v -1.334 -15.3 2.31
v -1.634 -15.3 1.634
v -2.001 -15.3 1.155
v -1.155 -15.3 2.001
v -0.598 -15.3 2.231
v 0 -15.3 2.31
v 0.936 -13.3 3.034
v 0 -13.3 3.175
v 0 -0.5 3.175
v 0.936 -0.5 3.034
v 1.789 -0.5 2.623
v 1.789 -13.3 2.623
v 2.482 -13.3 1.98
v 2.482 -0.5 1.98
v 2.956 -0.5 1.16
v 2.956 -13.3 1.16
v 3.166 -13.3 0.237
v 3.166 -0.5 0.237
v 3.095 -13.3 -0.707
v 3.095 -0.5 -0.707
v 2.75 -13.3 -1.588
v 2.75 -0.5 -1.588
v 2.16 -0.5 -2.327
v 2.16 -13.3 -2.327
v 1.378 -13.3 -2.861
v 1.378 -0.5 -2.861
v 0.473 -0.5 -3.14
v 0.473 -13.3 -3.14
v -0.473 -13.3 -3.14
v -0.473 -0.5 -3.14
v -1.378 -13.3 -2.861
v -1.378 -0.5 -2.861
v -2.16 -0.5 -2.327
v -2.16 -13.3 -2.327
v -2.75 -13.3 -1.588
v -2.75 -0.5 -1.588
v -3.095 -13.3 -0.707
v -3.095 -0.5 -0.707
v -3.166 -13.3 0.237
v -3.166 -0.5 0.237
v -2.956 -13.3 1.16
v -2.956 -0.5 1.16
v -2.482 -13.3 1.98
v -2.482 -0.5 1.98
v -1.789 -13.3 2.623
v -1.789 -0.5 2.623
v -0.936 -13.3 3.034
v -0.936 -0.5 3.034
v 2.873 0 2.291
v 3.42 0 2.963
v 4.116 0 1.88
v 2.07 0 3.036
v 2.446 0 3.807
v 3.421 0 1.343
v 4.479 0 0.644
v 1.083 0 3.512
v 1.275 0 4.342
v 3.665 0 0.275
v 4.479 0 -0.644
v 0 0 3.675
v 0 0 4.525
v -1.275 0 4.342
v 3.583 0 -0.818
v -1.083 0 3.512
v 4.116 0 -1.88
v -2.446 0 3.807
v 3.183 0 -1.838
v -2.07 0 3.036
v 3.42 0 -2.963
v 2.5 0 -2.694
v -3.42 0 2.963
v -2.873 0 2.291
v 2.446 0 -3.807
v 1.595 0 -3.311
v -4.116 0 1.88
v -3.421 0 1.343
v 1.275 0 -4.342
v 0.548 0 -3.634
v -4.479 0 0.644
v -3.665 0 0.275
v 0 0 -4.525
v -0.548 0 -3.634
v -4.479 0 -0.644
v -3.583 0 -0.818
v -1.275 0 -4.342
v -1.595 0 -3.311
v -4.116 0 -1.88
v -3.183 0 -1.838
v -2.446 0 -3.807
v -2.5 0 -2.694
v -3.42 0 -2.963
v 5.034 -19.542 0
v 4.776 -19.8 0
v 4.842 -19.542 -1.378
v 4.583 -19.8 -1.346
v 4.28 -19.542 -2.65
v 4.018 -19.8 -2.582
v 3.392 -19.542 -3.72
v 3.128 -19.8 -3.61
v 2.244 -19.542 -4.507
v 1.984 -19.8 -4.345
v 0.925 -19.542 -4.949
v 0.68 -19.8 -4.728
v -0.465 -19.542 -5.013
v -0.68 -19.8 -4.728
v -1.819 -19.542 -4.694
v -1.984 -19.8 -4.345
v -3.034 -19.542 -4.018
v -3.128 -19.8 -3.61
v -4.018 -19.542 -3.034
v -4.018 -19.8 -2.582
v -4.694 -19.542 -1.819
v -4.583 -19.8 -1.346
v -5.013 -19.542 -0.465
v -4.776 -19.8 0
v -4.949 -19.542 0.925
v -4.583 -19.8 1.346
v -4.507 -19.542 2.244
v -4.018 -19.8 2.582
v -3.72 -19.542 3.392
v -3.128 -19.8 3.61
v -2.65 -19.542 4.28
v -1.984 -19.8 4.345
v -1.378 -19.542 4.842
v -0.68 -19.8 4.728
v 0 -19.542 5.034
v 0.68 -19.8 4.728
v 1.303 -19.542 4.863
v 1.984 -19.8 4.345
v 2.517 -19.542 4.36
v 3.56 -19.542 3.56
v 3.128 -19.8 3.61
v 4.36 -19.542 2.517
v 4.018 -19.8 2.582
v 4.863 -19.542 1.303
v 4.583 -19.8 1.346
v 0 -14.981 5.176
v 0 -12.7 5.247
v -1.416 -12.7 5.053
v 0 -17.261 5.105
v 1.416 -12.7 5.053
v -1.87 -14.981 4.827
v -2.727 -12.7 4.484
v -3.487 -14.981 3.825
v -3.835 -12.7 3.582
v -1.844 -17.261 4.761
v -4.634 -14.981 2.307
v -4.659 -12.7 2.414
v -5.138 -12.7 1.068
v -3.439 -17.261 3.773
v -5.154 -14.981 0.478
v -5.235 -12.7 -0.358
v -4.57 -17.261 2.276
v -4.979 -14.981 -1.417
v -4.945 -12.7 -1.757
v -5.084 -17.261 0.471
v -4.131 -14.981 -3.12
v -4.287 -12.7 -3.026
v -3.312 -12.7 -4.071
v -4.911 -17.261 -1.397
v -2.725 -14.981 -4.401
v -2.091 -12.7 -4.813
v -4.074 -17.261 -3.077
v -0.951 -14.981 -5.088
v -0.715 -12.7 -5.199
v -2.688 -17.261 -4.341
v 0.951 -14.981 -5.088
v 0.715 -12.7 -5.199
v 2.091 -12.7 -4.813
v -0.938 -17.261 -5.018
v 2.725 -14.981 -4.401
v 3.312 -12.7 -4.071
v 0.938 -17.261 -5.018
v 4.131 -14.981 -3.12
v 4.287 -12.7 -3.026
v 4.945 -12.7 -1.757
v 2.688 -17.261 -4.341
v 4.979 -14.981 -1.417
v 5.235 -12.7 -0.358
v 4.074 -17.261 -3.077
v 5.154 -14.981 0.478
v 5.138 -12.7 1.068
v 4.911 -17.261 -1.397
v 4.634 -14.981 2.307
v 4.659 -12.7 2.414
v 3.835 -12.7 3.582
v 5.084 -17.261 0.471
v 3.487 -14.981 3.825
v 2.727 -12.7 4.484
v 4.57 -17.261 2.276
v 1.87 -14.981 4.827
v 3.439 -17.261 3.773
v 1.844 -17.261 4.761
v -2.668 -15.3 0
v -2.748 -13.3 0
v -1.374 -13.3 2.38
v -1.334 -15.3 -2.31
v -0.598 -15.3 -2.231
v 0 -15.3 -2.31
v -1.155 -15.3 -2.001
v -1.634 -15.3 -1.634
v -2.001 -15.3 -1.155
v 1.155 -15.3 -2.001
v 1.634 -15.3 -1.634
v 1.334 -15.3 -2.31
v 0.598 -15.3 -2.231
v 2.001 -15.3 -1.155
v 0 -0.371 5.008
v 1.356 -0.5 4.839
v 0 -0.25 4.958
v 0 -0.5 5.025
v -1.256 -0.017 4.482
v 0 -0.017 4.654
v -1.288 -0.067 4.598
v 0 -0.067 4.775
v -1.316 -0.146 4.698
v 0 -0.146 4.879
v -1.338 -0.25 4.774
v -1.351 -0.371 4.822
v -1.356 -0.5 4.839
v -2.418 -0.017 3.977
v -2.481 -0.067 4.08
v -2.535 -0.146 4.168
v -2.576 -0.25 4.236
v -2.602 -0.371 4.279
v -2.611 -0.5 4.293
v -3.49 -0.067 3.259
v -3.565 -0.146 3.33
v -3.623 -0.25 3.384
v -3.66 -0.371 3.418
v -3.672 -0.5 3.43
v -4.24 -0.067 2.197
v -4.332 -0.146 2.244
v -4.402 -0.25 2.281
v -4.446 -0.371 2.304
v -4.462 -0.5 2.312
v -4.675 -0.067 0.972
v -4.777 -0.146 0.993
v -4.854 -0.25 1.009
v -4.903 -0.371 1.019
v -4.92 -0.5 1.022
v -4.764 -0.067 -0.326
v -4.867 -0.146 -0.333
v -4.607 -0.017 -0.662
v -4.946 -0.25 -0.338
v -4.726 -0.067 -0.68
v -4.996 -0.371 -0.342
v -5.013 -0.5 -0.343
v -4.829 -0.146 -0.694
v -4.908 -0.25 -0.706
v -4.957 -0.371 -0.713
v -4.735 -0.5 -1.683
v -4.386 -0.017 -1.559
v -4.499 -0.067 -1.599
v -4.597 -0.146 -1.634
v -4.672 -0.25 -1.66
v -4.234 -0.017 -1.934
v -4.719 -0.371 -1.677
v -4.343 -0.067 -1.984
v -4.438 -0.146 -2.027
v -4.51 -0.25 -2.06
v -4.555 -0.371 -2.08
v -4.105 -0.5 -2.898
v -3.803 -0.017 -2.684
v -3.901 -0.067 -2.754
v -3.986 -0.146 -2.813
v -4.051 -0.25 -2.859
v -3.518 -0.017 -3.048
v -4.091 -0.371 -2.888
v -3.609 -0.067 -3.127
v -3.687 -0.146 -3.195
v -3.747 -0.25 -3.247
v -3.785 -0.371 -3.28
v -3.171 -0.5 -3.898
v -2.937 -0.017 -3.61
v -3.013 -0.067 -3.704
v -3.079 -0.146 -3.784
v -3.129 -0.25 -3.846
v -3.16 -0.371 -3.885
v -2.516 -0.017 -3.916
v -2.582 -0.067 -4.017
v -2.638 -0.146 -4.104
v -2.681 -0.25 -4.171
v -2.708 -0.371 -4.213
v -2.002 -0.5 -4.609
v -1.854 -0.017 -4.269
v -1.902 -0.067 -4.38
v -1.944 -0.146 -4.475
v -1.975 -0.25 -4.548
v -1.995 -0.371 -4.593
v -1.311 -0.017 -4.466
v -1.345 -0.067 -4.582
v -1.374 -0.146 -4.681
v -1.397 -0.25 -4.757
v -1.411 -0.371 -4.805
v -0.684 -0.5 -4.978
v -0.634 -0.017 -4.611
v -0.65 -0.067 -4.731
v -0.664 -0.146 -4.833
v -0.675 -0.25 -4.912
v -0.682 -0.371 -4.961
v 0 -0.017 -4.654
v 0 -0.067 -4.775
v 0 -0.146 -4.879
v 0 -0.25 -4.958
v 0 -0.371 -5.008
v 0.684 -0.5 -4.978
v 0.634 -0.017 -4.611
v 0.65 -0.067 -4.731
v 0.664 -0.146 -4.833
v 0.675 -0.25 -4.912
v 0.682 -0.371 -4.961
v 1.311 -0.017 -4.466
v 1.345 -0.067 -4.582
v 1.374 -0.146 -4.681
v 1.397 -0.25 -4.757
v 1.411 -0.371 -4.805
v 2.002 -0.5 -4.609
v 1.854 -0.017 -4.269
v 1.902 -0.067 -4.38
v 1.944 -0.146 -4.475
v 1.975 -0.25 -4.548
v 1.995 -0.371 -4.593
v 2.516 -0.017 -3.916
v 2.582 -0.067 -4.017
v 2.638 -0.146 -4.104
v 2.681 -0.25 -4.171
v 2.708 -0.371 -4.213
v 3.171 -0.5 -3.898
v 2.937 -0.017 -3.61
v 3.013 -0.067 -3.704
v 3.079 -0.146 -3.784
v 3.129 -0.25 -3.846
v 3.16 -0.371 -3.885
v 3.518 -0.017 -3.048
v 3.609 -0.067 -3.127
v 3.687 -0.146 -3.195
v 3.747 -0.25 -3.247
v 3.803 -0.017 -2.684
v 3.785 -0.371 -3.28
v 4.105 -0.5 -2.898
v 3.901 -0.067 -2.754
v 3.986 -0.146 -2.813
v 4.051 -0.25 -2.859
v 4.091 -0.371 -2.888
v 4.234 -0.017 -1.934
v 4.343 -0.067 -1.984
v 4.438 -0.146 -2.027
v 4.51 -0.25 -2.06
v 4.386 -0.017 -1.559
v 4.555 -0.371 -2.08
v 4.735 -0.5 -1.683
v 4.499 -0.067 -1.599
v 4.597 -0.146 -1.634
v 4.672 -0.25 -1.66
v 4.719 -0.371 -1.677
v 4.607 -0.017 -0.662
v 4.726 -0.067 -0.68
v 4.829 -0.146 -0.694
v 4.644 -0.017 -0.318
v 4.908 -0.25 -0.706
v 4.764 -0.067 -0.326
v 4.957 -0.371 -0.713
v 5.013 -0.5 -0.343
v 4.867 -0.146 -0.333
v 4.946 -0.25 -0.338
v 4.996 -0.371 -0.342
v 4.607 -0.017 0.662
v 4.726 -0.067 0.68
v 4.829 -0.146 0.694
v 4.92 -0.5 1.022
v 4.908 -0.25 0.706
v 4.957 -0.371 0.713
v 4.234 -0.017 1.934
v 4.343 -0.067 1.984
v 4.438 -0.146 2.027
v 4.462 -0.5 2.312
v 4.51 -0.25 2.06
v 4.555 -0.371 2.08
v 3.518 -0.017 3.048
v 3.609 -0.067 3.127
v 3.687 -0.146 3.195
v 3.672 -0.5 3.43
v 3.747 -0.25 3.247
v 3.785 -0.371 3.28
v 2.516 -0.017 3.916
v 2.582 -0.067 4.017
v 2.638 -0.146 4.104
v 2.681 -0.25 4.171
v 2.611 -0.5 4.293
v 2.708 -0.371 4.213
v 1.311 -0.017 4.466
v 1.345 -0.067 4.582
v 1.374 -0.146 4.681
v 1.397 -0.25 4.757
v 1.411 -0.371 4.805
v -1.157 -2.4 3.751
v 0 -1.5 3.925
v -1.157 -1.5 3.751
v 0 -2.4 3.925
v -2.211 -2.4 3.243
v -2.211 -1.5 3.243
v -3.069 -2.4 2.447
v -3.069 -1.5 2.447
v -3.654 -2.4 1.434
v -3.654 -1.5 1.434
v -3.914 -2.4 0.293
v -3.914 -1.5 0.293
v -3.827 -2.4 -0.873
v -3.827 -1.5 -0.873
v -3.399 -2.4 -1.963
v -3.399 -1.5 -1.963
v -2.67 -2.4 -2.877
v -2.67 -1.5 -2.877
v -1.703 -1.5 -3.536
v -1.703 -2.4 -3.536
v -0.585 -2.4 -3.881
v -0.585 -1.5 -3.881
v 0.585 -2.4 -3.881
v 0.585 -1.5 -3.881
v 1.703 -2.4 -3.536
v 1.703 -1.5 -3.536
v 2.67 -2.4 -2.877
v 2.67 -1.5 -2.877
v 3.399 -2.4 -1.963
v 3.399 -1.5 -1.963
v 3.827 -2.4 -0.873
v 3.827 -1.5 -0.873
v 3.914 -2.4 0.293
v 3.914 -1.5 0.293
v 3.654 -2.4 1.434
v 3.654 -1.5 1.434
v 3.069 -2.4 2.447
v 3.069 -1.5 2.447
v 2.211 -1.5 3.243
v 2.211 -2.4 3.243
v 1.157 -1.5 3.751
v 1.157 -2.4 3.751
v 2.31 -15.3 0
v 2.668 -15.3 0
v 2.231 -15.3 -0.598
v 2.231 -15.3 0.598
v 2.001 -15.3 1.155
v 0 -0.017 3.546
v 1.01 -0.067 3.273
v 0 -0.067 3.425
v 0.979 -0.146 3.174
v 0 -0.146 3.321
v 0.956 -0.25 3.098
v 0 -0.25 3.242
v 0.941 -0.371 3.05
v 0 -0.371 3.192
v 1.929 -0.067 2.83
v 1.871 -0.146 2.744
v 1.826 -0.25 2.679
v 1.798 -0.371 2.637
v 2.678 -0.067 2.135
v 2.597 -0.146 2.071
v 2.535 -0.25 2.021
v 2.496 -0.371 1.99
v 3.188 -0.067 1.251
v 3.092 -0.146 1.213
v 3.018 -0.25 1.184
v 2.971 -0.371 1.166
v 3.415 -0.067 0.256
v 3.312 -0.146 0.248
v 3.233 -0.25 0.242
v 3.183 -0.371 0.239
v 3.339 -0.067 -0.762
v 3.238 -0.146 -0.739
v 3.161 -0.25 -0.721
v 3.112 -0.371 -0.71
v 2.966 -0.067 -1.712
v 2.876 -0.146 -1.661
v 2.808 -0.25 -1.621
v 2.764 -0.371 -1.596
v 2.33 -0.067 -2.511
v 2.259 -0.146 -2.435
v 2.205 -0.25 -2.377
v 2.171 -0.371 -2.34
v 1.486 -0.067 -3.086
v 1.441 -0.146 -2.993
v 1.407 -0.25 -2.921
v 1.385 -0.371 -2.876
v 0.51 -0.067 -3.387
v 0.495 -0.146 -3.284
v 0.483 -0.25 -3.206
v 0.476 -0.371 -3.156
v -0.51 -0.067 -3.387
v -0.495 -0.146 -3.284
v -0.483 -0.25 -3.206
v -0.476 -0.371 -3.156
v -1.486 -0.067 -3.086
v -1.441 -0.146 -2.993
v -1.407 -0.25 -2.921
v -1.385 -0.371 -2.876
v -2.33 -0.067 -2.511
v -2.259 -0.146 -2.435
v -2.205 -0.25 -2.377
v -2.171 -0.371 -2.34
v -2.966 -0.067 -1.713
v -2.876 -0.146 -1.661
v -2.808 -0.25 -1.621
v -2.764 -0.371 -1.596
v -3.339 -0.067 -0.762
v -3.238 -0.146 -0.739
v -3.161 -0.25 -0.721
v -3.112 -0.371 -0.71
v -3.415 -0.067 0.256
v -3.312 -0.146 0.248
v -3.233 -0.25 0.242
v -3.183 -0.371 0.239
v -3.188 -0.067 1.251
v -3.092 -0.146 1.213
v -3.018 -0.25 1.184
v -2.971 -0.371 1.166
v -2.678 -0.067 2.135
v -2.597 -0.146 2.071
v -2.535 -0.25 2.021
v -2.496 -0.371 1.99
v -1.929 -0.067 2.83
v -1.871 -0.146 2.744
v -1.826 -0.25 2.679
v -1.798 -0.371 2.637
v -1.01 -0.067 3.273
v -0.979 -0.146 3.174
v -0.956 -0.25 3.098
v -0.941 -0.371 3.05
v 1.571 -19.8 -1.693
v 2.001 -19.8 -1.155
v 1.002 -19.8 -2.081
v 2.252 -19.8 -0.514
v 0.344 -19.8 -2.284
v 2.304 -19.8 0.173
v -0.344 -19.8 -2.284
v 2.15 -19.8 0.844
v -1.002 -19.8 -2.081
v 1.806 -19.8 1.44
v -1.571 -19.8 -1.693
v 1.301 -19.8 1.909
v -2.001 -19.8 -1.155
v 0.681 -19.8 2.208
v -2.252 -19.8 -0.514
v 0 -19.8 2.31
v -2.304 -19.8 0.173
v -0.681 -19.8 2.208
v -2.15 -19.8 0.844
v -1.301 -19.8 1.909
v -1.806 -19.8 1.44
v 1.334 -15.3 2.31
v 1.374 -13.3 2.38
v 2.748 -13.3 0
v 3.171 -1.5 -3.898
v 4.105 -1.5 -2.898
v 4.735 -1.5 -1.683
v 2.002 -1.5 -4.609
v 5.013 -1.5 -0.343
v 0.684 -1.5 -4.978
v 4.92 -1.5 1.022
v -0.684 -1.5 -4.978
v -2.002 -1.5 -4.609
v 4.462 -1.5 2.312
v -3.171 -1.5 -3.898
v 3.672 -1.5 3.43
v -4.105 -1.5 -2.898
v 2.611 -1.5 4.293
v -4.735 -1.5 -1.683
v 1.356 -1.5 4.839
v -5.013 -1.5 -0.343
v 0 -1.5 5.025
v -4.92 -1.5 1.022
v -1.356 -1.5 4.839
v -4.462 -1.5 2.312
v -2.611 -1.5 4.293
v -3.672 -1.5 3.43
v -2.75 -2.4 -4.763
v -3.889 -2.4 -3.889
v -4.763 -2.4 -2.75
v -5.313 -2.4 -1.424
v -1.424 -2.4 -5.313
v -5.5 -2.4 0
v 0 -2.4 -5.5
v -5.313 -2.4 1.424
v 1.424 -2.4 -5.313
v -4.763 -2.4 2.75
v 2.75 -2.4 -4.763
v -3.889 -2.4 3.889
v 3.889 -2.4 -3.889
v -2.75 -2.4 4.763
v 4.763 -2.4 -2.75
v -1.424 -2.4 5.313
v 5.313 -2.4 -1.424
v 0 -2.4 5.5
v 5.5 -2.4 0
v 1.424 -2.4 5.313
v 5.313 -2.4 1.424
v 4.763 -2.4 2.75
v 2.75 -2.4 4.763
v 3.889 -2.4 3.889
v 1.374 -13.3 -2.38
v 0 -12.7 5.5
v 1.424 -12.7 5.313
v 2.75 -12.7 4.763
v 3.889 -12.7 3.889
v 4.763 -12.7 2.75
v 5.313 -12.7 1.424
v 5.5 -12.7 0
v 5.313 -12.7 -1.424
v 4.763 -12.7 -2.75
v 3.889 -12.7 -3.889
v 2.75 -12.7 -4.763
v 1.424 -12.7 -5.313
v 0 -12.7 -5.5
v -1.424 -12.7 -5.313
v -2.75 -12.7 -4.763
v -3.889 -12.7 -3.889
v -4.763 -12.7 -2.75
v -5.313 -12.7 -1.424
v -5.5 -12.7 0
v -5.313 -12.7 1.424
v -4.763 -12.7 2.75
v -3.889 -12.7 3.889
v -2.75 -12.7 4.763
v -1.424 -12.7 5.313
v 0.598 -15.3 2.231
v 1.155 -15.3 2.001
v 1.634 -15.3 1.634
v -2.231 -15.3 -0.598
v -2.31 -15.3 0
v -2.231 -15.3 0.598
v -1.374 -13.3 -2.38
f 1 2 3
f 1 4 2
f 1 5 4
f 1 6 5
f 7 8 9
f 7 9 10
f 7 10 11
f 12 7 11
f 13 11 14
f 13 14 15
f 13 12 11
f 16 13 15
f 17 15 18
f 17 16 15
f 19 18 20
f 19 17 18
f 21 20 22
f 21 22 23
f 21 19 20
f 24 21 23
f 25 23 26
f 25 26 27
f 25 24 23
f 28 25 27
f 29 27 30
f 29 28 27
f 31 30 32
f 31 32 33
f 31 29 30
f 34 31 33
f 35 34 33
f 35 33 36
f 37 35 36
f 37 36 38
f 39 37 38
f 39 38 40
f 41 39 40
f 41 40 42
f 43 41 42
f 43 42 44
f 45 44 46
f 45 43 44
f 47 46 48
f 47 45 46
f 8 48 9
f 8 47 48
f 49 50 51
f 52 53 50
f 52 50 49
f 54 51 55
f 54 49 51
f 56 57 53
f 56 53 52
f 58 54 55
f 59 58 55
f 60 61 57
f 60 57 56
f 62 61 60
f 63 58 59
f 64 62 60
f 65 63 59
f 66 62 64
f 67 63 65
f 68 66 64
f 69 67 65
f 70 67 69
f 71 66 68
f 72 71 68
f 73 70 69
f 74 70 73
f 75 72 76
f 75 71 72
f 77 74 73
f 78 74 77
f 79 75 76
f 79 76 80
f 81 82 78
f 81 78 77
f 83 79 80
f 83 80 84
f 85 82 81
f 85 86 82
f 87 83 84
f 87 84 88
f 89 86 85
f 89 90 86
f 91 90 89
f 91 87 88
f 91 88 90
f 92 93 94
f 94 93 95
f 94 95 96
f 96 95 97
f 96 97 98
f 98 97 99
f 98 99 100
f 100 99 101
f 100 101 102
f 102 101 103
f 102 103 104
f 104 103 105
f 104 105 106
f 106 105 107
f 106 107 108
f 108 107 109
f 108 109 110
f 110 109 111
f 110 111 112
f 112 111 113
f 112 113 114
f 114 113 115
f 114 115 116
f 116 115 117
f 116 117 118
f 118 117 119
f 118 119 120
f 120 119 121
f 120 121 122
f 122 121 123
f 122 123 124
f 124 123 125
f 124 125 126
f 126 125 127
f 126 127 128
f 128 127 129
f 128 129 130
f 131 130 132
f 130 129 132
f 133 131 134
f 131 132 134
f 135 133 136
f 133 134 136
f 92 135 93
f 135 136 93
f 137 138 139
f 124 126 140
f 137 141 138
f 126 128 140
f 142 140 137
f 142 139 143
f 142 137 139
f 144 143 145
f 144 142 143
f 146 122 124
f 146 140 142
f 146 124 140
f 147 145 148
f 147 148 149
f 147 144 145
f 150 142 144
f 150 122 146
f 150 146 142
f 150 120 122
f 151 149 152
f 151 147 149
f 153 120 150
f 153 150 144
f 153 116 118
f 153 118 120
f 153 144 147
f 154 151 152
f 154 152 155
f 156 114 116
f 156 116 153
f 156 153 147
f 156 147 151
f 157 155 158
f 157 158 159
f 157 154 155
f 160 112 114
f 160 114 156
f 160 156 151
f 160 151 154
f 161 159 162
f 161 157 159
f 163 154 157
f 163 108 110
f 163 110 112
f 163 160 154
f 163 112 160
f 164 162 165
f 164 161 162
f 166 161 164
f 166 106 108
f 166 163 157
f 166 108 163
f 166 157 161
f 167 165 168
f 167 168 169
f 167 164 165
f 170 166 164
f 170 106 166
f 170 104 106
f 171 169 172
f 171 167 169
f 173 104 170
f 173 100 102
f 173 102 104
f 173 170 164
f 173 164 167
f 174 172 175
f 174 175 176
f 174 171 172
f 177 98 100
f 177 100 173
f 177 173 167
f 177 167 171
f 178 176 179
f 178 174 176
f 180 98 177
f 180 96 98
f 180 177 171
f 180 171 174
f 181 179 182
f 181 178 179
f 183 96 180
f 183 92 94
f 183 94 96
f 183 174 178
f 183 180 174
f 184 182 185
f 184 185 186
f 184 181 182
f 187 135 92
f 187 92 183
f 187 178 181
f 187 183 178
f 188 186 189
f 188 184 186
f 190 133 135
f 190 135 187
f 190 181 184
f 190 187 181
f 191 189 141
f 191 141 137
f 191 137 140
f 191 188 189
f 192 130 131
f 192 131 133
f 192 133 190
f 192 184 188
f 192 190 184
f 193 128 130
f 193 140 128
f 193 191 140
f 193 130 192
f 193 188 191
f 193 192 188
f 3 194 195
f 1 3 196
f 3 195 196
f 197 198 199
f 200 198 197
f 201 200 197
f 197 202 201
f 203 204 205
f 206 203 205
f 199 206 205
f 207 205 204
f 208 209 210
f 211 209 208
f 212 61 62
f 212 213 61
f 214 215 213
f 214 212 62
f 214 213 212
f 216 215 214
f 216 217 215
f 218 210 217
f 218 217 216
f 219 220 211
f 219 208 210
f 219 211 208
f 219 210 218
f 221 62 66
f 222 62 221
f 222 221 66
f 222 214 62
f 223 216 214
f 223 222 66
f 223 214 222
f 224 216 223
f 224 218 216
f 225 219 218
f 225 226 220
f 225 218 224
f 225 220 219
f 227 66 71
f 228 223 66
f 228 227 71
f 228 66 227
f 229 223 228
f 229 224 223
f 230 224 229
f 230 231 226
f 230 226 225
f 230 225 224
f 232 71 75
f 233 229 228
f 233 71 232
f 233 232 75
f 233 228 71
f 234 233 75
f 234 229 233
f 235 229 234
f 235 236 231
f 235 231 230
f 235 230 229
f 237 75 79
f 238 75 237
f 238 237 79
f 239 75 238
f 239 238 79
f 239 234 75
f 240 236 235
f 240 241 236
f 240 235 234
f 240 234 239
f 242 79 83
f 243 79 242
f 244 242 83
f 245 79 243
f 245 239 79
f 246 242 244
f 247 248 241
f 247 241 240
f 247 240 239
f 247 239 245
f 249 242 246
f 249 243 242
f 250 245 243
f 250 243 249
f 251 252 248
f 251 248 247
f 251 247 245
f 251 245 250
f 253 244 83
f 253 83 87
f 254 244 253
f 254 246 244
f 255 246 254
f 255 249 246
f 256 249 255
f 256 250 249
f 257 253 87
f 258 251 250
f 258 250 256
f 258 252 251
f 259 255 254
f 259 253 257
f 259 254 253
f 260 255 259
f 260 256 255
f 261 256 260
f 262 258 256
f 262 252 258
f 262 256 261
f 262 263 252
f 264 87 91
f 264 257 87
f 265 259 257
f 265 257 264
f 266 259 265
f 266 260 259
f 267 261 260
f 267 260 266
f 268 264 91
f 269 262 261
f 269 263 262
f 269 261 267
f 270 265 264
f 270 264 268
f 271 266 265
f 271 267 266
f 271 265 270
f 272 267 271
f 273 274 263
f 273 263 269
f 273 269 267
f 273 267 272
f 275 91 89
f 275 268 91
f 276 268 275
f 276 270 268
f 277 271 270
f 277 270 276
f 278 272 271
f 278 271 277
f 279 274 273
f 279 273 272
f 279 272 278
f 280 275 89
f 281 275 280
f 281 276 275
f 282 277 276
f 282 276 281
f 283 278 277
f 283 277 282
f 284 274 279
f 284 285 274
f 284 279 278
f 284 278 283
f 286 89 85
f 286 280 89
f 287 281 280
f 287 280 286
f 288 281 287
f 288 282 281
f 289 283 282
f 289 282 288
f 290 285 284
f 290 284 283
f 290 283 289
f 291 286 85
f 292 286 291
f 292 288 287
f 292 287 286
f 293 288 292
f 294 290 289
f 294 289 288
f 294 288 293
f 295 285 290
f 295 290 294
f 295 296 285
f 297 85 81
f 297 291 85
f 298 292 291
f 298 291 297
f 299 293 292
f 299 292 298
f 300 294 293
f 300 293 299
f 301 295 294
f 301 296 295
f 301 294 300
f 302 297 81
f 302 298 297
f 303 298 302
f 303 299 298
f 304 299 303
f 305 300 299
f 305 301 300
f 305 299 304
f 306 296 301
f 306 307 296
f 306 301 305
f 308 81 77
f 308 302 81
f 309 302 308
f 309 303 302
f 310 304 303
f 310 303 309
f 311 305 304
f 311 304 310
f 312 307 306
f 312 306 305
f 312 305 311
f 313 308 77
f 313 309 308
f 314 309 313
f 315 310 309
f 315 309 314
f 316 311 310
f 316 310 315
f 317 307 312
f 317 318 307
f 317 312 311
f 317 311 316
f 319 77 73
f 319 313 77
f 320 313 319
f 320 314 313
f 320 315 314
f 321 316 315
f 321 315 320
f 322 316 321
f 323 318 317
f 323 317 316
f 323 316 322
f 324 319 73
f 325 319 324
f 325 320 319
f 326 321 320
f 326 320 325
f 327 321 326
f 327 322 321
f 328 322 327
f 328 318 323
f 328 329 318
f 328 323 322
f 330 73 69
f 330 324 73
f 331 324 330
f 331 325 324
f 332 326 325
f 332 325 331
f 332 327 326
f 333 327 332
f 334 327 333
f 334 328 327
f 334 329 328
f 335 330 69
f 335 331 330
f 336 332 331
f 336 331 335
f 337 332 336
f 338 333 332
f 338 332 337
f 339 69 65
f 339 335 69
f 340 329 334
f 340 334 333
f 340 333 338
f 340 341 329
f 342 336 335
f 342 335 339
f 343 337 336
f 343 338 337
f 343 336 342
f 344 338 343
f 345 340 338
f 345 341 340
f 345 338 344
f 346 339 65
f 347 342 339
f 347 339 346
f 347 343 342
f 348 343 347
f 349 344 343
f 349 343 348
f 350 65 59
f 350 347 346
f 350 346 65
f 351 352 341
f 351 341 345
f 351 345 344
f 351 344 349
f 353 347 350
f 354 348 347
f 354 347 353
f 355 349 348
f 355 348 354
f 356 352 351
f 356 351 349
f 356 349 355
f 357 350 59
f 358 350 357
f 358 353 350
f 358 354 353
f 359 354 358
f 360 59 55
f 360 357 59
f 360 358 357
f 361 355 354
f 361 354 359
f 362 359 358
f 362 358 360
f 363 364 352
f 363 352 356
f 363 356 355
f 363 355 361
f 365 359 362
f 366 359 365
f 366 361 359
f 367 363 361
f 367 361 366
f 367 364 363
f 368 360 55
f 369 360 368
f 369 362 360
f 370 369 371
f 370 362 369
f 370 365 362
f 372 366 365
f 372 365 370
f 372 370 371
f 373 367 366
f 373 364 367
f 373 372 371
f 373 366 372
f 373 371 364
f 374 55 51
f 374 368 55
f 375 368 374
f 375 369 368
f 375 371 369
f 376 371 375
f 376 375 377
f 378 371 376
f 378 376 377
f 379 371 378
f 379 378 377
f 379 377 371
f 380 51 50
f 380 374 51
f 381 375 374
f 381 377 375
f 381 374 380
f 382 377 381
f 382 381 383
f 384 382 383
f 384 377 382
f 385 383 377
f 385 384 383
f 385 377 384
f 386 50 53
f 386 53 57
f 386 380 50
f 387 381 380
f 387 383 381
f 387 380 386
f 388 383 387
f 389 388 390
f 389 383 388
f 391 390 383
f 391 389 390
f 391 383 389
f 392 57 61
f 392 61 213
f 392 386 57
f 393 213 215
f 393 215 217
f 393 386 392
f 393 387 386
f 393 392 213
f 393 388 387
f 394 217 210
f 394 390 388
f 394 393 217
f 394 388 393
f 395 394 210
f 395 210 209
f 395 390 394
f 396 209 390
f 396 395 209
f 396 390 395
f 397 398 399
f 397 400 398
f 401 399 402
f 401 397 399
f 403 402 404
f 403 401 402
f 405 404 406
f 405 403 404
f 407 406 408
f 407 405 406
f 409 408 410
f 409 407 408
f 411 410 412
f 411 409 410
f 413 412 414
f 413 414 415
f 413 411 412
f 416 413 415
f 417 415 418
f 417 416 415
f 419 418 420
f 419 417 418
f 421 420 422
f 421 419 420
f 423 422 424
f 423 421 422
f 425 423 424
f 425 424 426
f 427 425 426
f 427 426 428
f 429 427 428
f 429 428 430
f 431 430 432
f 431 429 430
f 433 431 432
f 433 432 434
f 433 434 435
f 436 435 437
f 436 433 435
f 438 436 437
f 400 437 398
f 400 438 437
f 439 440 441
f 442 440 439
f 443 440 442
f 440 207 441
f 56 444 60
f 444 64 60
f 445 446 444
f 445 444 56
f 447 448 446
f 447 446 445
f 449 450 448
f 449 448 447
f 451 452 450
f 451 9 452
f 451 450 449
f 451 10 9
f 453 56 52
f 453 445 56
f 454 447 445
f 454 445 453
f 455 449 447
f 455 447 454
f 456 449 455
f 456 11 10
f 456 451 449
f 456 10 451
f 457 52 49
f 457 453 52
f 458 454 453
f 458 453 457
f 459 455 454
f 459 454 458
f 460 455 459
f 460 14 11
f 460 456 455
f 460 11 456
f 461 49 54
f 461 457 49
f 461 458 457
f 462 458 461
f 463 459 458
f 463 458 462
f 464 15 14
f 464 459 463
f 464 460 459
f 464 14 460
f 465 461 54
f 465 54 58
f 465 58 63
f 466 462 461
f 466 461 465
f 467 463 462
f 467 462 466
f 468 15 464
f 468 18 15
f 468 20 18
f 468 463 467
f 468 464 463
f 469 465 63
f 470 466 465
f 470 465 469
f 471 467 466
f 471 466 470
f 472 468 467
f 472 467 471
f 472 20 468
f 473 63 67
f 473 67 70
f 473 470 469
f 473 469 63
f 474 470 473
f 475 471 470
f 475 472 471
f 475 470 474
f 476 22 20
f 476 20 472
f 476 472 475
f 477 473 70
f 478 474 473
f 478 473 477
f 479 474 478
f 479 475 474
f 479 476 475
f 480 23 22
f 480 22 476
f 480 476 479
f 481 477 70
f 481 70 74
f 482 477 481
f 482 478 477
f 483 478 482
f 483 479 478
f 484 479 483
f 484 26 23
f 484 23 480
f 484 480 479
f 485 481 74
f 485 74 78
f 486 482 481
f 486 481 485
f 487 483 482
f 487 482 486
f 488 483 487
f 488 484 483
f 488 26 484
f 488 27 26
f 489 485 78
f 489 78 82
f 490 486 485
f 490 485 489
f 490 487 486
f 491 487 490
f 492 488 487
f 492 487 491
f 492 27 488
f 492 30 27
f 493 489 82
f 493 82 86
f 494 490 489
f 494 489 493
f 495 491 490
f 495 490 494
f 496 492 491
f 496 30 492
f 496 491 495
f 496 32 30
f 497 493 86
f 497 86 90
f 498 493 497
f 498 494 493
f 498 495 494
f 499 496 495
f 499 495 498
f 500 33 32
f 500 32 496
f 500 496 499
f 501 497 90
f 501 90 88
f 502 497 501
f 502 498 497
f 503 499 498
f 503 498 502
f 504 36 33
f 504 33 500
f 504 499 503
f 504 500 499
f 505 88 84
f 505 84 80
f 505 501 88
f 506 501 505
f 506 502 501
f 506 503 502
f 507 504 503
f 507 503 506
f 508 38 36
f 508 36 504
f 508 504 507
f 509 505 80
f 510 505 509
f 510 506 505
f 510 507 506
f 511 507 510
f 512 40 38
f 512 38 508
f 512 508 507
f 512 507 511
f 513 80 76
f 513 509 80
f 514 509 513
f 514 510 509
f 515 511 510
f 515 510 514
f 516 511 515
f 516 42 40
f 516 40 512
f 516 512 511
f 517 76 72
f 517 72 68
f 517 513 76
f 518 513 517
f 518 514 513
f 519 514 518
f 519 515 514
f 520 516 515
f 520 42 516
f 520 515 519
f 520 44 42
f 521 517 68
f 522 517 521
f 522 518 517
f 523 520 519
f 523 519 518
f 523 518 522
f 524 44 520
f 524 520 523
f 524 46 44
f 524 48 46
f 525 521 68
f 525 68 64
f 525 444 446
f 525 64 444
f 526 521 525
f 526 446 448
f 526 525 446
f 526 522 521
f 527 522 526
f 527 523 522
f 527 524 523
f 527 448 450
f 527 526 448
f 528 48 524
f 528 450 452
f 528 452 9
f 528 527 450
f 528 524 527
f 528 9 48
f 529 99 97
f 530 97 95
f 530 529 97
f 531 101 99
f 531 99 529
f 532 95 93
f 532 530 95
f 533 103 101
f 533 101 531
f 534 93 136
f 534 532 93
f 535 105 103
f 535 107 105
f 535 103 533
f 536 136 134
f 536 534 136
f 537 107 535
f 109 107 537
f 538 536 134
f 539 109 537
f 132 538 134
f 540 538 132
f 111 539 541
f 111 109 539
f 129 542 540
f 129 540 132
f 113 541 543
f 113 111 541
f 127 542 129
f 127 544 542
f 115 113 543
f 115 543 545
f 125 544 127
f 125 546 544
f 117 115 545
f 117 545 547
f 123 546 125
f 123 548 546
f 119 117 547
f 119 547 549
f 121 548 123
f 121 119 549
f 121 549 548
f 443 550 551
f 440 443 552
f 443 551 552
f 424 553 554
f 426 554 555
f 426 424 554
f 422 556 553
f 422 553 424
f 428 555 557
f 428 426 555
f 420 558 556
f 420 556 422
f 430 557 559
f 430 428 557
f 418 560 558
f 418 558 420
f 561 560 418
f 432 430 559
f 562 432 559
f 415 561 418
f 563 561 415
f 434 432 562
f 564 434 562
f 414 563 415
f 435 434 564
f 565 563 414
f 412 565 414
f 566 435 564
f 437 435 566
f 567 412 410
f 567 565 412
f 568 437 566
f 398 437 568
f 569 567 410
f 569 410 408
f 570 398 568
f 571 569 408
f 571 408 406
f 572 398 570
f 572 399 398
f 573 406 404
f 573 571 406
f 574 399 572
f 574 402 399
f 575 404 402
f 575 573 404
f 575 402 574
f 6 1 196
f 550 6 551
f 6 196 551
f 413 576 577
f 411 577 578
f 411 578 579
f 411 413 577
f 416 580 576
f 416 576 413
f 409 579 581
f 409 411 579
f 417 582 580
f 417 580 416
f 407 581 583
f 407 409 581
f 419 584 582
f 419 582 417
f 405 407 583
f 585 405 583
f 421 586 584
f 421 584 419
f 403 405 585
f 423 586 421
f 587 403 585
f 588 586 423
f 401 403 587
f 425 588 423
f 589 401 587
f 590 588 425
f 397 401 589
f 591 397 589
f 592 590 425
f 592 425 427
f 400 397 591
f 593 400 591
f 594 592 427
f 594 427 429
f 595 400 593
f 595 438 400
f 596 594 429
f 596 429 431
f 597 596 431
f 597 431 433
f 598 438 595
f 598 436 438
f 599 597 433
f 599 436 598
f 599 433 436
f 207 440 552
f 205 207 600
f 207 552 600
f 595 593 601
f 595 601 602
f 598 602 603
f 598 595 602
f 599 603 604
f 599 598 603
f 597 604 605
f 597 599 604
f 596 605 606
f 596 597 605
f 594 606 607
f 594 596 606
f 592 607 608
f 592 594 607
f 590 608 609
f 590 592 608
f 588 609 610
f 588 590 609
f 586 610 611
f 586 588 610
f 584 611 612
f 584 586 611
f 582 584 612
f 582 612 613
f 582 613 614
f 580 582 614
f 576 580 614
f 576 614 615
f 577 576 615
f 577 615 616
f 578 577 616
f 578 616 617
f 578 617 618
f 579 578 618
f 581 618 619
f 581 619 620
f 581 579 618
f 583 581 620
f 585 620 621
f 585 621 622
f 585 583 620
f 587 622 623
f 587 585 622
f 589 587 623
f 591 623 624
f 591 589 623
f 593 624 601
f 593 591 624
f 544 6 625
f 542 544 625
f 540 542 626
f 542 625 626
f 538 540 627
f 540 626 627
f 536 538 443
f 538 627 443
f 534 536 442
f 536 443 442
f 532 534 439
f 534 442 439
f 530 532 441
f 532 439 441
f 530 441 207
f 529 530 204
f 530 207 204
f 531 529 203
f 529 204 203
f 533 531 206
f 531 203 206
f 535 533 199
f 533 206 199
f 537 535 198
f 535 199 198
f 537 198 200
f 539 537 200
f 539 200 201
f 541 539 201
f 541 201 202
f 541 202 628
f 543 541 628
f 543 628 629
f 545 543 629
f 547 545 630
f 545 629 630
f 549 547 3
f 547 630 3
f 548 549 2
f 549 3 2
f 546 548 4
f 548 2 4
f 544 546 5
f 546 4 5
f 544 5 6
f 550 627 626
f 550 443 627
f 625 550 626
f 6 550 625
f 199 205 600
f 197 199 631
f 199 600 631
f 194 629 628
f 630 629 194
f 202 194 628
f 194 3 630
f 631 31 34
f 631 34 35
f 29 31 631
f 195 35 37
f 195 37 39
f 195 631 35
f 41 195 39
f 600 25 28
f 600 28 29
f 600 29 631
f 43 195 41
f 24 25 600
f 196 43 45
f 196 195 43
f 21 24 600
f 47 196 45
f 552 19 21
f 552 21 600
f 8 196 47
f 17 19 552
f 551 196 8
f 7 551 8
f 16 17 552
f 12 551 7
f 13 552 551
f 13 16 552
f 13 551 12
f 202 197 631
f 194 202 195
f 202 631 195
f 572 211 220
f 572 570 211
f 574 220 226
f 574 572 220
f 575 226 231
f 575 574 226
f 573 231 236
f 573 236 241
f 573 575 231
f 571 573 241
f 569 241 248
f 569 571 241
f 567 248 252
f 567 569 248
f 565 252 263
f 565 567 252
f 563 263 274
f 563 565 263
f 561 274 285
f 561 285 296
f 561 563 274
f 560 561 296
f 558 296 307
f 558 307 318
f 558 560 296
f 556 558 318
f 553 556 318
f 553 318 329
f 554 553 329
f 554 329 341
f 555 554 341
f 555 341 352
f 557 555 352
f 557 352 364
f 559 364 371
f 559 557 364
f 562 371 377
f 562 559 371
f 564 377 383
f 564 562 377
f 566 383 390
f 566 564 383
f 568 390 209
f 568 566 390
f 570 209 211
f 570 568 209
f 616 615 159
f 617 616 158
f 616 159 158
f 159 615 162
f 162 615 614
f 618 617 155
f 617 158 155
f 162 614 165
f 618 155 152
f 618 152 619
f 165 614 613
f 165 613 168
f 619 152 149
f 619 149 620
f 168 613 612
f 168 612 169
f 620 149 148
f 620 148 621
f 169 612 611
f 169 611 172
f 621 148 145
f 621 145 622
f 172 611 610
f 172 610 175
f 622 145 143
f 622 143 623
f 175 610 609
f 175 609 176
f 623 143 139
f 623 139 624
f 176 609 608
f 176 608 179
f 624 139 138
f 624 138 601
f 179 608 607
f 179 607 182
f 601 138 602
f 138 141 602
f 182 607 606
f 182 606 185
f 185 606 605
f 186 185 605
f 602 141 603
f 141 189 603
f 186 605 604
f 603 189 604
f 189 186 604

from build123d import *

# Parameters (mm, degrees)
UBODY_SKETCH_R = 5.5
UBODY_DEPTH    = 10.3
TUBE_START     = -13.3
TUBE_SKETCH_R  = 3.175
TUBE_DEPTH     = 13.3
TUBE_RADIUS_R  = 0.5
HEX_2_DEPTH    = 2
HEX_2_DRAFT    = -2
PORT_SKETCH_R  = 2.310158461
PORT_DEPTH     = 18.163624326


with BuildPart() as part:
    # Release_Sketch → Release (revolve)
    with BuildSketch(Plane.XY, mode=Mode.PRIVATE) as release_sk:
        with BuildLine():
            Line((0, 0), (-4.525, 0))
            ThreePointArc((-4.525, 0), (-4.878553391, -0.146446609), (-5.025, -0.5))
            Line((-5.025, -0.5), (-5.025, -1.5))
            Line((-5.025, -1.5), (-3.925, -1.5))
            Line((-3.925, -1.5), (-3.925, -2.4))
            Line((-3.925, -2.4), (0, -2.4))
            Line((0, -2.4), (0, 0))
        make_face()
    revolve(release_sk.sketch.rotate(Axis((0, 0, 0), (0, -1, 0)), 270), axis=Axis((0, 0, 0), (0, -1, 0)))

    # UBody_Sketch → UBody (add)
    with BuildSketch(Plane(origin=(0, -2.4, 0), x_dir=(-1, 0, 0), z_dir=(0, 1, 0))):
        with Locations(Location((0, 0, 0), (0, 0, 90))):
            Circle(UBODY_SKETCH_R)
    extrude(amount=-UBODY_DEPTH)

    # Thread_Sketch → Thread (revolve)
    with BuildSketch(Plane.XY, mode=Mode.PRIVATE) as thread_sk:
        Polygon((-5.247489296, -12.7), (-5.026347442, -19.8), (0, -19.8), (0, -12.7), align=None)
    revolve(thread_sk.sketch.rotate(Axis((0, 0, 0), (0, -1, 0)), 270), axis=Axis((0, 0, 0), (0, -1, 0)))

    # Thread_Chamfer: read off the stored shape, not the designer's step
    # Thread_Chamfer outline → Thread_Chamfer (revolve, cut)
    with BuildSketch(Plane.XY):
        Polygon((5.034384454, -19.541962988), (4.776347442, -19.8), (5.034384454, -19.8), align=None)
    revolve(axis=Axis((0, 0, 0), (0, 1, 0)), mode=Mode.SUBTRACT)

    # Tube_Sketch → Tube (cut)
    with BuildSketch(Plane(origin=(0, 0, 0), x_dir=(1, 0, 0), z_dir=(0, 1, 0)).offset(TUBE_START)):
        with Locations(Location((0, 0, 0), (0, 0, 270))):
            Circle(TUBE_SKETCH_R)
    extrude(amount=TUBE_DEPTH, mode=Mode.SUBTRACT)

    # Tube_Radius
    tube_radius_edges = [part.edges().sort_by_distance(p)[0] for p in [
        (0, 0, -3.175),
    ]]
    fillet(tube_radius_edges, radius=TUBE_RADIUS_R)


with BuildPart() as hex_2_tool:
    # Hex_Sketch → Hex 2 (with draft: the straight prism first)
    with BuildSketch(Plane(origin=(0, -13.3, 0), x_dir=(-1, 0, 0), z_dir=(0, 1, 0))):
        Polygon((-2.748187281, 0), (-1.374093641, -2.38), (1.374093641, -2.38), (2.748187281, 0), (1.374093641, 2.38), (-1.374093641, 2.38), align=None)
    extrude(amount=-HEX_2_DEPTH)
    # Hex 2: the draft: its side faces are tilted about the plane it starts from
    hex_2_sides = [hex_2_tool.faces().sort_by_distance(p)[0] for p in [
        (2.061140461, -14.3, -1.19),
        (0, -14.3, -2.38),
        (-2.061140461, -14.3, -1.19),
        (-2.061140461, -14.3, 1.19),
        (0, -14.3, 2.38),
        (2.061140461, -14.3, 1.19),
    ]]
    draft(hex_2_sides, Plane(origin=(0, -13.3, 0), x_dir=(-1, 0, 0), z_dir=(0, 1, 0)), HEX_2_DRAFT)


with BuildPart() as part_1:
    add(part.part)

    # Hex 2: cut by hex_2_tool
    add(hex_2_tool.part, mode=Mode.SUBTRACT)

    # Port_Sketch → Port (cut, through all)
    with BuildSketch(Plane(origin=(0, -15.3, 0), x_dir=(-1, 0, 0), z_dir=(0, 1, 0))):
        with Locations(Location((0, 0, 0), (0, 0, 90))):
            Circle(PORT_SKETCH_R)
    extrude(amount=-PORT_DEPTH, mode=Mode.SUBTRACT)


solid = part_1.part
